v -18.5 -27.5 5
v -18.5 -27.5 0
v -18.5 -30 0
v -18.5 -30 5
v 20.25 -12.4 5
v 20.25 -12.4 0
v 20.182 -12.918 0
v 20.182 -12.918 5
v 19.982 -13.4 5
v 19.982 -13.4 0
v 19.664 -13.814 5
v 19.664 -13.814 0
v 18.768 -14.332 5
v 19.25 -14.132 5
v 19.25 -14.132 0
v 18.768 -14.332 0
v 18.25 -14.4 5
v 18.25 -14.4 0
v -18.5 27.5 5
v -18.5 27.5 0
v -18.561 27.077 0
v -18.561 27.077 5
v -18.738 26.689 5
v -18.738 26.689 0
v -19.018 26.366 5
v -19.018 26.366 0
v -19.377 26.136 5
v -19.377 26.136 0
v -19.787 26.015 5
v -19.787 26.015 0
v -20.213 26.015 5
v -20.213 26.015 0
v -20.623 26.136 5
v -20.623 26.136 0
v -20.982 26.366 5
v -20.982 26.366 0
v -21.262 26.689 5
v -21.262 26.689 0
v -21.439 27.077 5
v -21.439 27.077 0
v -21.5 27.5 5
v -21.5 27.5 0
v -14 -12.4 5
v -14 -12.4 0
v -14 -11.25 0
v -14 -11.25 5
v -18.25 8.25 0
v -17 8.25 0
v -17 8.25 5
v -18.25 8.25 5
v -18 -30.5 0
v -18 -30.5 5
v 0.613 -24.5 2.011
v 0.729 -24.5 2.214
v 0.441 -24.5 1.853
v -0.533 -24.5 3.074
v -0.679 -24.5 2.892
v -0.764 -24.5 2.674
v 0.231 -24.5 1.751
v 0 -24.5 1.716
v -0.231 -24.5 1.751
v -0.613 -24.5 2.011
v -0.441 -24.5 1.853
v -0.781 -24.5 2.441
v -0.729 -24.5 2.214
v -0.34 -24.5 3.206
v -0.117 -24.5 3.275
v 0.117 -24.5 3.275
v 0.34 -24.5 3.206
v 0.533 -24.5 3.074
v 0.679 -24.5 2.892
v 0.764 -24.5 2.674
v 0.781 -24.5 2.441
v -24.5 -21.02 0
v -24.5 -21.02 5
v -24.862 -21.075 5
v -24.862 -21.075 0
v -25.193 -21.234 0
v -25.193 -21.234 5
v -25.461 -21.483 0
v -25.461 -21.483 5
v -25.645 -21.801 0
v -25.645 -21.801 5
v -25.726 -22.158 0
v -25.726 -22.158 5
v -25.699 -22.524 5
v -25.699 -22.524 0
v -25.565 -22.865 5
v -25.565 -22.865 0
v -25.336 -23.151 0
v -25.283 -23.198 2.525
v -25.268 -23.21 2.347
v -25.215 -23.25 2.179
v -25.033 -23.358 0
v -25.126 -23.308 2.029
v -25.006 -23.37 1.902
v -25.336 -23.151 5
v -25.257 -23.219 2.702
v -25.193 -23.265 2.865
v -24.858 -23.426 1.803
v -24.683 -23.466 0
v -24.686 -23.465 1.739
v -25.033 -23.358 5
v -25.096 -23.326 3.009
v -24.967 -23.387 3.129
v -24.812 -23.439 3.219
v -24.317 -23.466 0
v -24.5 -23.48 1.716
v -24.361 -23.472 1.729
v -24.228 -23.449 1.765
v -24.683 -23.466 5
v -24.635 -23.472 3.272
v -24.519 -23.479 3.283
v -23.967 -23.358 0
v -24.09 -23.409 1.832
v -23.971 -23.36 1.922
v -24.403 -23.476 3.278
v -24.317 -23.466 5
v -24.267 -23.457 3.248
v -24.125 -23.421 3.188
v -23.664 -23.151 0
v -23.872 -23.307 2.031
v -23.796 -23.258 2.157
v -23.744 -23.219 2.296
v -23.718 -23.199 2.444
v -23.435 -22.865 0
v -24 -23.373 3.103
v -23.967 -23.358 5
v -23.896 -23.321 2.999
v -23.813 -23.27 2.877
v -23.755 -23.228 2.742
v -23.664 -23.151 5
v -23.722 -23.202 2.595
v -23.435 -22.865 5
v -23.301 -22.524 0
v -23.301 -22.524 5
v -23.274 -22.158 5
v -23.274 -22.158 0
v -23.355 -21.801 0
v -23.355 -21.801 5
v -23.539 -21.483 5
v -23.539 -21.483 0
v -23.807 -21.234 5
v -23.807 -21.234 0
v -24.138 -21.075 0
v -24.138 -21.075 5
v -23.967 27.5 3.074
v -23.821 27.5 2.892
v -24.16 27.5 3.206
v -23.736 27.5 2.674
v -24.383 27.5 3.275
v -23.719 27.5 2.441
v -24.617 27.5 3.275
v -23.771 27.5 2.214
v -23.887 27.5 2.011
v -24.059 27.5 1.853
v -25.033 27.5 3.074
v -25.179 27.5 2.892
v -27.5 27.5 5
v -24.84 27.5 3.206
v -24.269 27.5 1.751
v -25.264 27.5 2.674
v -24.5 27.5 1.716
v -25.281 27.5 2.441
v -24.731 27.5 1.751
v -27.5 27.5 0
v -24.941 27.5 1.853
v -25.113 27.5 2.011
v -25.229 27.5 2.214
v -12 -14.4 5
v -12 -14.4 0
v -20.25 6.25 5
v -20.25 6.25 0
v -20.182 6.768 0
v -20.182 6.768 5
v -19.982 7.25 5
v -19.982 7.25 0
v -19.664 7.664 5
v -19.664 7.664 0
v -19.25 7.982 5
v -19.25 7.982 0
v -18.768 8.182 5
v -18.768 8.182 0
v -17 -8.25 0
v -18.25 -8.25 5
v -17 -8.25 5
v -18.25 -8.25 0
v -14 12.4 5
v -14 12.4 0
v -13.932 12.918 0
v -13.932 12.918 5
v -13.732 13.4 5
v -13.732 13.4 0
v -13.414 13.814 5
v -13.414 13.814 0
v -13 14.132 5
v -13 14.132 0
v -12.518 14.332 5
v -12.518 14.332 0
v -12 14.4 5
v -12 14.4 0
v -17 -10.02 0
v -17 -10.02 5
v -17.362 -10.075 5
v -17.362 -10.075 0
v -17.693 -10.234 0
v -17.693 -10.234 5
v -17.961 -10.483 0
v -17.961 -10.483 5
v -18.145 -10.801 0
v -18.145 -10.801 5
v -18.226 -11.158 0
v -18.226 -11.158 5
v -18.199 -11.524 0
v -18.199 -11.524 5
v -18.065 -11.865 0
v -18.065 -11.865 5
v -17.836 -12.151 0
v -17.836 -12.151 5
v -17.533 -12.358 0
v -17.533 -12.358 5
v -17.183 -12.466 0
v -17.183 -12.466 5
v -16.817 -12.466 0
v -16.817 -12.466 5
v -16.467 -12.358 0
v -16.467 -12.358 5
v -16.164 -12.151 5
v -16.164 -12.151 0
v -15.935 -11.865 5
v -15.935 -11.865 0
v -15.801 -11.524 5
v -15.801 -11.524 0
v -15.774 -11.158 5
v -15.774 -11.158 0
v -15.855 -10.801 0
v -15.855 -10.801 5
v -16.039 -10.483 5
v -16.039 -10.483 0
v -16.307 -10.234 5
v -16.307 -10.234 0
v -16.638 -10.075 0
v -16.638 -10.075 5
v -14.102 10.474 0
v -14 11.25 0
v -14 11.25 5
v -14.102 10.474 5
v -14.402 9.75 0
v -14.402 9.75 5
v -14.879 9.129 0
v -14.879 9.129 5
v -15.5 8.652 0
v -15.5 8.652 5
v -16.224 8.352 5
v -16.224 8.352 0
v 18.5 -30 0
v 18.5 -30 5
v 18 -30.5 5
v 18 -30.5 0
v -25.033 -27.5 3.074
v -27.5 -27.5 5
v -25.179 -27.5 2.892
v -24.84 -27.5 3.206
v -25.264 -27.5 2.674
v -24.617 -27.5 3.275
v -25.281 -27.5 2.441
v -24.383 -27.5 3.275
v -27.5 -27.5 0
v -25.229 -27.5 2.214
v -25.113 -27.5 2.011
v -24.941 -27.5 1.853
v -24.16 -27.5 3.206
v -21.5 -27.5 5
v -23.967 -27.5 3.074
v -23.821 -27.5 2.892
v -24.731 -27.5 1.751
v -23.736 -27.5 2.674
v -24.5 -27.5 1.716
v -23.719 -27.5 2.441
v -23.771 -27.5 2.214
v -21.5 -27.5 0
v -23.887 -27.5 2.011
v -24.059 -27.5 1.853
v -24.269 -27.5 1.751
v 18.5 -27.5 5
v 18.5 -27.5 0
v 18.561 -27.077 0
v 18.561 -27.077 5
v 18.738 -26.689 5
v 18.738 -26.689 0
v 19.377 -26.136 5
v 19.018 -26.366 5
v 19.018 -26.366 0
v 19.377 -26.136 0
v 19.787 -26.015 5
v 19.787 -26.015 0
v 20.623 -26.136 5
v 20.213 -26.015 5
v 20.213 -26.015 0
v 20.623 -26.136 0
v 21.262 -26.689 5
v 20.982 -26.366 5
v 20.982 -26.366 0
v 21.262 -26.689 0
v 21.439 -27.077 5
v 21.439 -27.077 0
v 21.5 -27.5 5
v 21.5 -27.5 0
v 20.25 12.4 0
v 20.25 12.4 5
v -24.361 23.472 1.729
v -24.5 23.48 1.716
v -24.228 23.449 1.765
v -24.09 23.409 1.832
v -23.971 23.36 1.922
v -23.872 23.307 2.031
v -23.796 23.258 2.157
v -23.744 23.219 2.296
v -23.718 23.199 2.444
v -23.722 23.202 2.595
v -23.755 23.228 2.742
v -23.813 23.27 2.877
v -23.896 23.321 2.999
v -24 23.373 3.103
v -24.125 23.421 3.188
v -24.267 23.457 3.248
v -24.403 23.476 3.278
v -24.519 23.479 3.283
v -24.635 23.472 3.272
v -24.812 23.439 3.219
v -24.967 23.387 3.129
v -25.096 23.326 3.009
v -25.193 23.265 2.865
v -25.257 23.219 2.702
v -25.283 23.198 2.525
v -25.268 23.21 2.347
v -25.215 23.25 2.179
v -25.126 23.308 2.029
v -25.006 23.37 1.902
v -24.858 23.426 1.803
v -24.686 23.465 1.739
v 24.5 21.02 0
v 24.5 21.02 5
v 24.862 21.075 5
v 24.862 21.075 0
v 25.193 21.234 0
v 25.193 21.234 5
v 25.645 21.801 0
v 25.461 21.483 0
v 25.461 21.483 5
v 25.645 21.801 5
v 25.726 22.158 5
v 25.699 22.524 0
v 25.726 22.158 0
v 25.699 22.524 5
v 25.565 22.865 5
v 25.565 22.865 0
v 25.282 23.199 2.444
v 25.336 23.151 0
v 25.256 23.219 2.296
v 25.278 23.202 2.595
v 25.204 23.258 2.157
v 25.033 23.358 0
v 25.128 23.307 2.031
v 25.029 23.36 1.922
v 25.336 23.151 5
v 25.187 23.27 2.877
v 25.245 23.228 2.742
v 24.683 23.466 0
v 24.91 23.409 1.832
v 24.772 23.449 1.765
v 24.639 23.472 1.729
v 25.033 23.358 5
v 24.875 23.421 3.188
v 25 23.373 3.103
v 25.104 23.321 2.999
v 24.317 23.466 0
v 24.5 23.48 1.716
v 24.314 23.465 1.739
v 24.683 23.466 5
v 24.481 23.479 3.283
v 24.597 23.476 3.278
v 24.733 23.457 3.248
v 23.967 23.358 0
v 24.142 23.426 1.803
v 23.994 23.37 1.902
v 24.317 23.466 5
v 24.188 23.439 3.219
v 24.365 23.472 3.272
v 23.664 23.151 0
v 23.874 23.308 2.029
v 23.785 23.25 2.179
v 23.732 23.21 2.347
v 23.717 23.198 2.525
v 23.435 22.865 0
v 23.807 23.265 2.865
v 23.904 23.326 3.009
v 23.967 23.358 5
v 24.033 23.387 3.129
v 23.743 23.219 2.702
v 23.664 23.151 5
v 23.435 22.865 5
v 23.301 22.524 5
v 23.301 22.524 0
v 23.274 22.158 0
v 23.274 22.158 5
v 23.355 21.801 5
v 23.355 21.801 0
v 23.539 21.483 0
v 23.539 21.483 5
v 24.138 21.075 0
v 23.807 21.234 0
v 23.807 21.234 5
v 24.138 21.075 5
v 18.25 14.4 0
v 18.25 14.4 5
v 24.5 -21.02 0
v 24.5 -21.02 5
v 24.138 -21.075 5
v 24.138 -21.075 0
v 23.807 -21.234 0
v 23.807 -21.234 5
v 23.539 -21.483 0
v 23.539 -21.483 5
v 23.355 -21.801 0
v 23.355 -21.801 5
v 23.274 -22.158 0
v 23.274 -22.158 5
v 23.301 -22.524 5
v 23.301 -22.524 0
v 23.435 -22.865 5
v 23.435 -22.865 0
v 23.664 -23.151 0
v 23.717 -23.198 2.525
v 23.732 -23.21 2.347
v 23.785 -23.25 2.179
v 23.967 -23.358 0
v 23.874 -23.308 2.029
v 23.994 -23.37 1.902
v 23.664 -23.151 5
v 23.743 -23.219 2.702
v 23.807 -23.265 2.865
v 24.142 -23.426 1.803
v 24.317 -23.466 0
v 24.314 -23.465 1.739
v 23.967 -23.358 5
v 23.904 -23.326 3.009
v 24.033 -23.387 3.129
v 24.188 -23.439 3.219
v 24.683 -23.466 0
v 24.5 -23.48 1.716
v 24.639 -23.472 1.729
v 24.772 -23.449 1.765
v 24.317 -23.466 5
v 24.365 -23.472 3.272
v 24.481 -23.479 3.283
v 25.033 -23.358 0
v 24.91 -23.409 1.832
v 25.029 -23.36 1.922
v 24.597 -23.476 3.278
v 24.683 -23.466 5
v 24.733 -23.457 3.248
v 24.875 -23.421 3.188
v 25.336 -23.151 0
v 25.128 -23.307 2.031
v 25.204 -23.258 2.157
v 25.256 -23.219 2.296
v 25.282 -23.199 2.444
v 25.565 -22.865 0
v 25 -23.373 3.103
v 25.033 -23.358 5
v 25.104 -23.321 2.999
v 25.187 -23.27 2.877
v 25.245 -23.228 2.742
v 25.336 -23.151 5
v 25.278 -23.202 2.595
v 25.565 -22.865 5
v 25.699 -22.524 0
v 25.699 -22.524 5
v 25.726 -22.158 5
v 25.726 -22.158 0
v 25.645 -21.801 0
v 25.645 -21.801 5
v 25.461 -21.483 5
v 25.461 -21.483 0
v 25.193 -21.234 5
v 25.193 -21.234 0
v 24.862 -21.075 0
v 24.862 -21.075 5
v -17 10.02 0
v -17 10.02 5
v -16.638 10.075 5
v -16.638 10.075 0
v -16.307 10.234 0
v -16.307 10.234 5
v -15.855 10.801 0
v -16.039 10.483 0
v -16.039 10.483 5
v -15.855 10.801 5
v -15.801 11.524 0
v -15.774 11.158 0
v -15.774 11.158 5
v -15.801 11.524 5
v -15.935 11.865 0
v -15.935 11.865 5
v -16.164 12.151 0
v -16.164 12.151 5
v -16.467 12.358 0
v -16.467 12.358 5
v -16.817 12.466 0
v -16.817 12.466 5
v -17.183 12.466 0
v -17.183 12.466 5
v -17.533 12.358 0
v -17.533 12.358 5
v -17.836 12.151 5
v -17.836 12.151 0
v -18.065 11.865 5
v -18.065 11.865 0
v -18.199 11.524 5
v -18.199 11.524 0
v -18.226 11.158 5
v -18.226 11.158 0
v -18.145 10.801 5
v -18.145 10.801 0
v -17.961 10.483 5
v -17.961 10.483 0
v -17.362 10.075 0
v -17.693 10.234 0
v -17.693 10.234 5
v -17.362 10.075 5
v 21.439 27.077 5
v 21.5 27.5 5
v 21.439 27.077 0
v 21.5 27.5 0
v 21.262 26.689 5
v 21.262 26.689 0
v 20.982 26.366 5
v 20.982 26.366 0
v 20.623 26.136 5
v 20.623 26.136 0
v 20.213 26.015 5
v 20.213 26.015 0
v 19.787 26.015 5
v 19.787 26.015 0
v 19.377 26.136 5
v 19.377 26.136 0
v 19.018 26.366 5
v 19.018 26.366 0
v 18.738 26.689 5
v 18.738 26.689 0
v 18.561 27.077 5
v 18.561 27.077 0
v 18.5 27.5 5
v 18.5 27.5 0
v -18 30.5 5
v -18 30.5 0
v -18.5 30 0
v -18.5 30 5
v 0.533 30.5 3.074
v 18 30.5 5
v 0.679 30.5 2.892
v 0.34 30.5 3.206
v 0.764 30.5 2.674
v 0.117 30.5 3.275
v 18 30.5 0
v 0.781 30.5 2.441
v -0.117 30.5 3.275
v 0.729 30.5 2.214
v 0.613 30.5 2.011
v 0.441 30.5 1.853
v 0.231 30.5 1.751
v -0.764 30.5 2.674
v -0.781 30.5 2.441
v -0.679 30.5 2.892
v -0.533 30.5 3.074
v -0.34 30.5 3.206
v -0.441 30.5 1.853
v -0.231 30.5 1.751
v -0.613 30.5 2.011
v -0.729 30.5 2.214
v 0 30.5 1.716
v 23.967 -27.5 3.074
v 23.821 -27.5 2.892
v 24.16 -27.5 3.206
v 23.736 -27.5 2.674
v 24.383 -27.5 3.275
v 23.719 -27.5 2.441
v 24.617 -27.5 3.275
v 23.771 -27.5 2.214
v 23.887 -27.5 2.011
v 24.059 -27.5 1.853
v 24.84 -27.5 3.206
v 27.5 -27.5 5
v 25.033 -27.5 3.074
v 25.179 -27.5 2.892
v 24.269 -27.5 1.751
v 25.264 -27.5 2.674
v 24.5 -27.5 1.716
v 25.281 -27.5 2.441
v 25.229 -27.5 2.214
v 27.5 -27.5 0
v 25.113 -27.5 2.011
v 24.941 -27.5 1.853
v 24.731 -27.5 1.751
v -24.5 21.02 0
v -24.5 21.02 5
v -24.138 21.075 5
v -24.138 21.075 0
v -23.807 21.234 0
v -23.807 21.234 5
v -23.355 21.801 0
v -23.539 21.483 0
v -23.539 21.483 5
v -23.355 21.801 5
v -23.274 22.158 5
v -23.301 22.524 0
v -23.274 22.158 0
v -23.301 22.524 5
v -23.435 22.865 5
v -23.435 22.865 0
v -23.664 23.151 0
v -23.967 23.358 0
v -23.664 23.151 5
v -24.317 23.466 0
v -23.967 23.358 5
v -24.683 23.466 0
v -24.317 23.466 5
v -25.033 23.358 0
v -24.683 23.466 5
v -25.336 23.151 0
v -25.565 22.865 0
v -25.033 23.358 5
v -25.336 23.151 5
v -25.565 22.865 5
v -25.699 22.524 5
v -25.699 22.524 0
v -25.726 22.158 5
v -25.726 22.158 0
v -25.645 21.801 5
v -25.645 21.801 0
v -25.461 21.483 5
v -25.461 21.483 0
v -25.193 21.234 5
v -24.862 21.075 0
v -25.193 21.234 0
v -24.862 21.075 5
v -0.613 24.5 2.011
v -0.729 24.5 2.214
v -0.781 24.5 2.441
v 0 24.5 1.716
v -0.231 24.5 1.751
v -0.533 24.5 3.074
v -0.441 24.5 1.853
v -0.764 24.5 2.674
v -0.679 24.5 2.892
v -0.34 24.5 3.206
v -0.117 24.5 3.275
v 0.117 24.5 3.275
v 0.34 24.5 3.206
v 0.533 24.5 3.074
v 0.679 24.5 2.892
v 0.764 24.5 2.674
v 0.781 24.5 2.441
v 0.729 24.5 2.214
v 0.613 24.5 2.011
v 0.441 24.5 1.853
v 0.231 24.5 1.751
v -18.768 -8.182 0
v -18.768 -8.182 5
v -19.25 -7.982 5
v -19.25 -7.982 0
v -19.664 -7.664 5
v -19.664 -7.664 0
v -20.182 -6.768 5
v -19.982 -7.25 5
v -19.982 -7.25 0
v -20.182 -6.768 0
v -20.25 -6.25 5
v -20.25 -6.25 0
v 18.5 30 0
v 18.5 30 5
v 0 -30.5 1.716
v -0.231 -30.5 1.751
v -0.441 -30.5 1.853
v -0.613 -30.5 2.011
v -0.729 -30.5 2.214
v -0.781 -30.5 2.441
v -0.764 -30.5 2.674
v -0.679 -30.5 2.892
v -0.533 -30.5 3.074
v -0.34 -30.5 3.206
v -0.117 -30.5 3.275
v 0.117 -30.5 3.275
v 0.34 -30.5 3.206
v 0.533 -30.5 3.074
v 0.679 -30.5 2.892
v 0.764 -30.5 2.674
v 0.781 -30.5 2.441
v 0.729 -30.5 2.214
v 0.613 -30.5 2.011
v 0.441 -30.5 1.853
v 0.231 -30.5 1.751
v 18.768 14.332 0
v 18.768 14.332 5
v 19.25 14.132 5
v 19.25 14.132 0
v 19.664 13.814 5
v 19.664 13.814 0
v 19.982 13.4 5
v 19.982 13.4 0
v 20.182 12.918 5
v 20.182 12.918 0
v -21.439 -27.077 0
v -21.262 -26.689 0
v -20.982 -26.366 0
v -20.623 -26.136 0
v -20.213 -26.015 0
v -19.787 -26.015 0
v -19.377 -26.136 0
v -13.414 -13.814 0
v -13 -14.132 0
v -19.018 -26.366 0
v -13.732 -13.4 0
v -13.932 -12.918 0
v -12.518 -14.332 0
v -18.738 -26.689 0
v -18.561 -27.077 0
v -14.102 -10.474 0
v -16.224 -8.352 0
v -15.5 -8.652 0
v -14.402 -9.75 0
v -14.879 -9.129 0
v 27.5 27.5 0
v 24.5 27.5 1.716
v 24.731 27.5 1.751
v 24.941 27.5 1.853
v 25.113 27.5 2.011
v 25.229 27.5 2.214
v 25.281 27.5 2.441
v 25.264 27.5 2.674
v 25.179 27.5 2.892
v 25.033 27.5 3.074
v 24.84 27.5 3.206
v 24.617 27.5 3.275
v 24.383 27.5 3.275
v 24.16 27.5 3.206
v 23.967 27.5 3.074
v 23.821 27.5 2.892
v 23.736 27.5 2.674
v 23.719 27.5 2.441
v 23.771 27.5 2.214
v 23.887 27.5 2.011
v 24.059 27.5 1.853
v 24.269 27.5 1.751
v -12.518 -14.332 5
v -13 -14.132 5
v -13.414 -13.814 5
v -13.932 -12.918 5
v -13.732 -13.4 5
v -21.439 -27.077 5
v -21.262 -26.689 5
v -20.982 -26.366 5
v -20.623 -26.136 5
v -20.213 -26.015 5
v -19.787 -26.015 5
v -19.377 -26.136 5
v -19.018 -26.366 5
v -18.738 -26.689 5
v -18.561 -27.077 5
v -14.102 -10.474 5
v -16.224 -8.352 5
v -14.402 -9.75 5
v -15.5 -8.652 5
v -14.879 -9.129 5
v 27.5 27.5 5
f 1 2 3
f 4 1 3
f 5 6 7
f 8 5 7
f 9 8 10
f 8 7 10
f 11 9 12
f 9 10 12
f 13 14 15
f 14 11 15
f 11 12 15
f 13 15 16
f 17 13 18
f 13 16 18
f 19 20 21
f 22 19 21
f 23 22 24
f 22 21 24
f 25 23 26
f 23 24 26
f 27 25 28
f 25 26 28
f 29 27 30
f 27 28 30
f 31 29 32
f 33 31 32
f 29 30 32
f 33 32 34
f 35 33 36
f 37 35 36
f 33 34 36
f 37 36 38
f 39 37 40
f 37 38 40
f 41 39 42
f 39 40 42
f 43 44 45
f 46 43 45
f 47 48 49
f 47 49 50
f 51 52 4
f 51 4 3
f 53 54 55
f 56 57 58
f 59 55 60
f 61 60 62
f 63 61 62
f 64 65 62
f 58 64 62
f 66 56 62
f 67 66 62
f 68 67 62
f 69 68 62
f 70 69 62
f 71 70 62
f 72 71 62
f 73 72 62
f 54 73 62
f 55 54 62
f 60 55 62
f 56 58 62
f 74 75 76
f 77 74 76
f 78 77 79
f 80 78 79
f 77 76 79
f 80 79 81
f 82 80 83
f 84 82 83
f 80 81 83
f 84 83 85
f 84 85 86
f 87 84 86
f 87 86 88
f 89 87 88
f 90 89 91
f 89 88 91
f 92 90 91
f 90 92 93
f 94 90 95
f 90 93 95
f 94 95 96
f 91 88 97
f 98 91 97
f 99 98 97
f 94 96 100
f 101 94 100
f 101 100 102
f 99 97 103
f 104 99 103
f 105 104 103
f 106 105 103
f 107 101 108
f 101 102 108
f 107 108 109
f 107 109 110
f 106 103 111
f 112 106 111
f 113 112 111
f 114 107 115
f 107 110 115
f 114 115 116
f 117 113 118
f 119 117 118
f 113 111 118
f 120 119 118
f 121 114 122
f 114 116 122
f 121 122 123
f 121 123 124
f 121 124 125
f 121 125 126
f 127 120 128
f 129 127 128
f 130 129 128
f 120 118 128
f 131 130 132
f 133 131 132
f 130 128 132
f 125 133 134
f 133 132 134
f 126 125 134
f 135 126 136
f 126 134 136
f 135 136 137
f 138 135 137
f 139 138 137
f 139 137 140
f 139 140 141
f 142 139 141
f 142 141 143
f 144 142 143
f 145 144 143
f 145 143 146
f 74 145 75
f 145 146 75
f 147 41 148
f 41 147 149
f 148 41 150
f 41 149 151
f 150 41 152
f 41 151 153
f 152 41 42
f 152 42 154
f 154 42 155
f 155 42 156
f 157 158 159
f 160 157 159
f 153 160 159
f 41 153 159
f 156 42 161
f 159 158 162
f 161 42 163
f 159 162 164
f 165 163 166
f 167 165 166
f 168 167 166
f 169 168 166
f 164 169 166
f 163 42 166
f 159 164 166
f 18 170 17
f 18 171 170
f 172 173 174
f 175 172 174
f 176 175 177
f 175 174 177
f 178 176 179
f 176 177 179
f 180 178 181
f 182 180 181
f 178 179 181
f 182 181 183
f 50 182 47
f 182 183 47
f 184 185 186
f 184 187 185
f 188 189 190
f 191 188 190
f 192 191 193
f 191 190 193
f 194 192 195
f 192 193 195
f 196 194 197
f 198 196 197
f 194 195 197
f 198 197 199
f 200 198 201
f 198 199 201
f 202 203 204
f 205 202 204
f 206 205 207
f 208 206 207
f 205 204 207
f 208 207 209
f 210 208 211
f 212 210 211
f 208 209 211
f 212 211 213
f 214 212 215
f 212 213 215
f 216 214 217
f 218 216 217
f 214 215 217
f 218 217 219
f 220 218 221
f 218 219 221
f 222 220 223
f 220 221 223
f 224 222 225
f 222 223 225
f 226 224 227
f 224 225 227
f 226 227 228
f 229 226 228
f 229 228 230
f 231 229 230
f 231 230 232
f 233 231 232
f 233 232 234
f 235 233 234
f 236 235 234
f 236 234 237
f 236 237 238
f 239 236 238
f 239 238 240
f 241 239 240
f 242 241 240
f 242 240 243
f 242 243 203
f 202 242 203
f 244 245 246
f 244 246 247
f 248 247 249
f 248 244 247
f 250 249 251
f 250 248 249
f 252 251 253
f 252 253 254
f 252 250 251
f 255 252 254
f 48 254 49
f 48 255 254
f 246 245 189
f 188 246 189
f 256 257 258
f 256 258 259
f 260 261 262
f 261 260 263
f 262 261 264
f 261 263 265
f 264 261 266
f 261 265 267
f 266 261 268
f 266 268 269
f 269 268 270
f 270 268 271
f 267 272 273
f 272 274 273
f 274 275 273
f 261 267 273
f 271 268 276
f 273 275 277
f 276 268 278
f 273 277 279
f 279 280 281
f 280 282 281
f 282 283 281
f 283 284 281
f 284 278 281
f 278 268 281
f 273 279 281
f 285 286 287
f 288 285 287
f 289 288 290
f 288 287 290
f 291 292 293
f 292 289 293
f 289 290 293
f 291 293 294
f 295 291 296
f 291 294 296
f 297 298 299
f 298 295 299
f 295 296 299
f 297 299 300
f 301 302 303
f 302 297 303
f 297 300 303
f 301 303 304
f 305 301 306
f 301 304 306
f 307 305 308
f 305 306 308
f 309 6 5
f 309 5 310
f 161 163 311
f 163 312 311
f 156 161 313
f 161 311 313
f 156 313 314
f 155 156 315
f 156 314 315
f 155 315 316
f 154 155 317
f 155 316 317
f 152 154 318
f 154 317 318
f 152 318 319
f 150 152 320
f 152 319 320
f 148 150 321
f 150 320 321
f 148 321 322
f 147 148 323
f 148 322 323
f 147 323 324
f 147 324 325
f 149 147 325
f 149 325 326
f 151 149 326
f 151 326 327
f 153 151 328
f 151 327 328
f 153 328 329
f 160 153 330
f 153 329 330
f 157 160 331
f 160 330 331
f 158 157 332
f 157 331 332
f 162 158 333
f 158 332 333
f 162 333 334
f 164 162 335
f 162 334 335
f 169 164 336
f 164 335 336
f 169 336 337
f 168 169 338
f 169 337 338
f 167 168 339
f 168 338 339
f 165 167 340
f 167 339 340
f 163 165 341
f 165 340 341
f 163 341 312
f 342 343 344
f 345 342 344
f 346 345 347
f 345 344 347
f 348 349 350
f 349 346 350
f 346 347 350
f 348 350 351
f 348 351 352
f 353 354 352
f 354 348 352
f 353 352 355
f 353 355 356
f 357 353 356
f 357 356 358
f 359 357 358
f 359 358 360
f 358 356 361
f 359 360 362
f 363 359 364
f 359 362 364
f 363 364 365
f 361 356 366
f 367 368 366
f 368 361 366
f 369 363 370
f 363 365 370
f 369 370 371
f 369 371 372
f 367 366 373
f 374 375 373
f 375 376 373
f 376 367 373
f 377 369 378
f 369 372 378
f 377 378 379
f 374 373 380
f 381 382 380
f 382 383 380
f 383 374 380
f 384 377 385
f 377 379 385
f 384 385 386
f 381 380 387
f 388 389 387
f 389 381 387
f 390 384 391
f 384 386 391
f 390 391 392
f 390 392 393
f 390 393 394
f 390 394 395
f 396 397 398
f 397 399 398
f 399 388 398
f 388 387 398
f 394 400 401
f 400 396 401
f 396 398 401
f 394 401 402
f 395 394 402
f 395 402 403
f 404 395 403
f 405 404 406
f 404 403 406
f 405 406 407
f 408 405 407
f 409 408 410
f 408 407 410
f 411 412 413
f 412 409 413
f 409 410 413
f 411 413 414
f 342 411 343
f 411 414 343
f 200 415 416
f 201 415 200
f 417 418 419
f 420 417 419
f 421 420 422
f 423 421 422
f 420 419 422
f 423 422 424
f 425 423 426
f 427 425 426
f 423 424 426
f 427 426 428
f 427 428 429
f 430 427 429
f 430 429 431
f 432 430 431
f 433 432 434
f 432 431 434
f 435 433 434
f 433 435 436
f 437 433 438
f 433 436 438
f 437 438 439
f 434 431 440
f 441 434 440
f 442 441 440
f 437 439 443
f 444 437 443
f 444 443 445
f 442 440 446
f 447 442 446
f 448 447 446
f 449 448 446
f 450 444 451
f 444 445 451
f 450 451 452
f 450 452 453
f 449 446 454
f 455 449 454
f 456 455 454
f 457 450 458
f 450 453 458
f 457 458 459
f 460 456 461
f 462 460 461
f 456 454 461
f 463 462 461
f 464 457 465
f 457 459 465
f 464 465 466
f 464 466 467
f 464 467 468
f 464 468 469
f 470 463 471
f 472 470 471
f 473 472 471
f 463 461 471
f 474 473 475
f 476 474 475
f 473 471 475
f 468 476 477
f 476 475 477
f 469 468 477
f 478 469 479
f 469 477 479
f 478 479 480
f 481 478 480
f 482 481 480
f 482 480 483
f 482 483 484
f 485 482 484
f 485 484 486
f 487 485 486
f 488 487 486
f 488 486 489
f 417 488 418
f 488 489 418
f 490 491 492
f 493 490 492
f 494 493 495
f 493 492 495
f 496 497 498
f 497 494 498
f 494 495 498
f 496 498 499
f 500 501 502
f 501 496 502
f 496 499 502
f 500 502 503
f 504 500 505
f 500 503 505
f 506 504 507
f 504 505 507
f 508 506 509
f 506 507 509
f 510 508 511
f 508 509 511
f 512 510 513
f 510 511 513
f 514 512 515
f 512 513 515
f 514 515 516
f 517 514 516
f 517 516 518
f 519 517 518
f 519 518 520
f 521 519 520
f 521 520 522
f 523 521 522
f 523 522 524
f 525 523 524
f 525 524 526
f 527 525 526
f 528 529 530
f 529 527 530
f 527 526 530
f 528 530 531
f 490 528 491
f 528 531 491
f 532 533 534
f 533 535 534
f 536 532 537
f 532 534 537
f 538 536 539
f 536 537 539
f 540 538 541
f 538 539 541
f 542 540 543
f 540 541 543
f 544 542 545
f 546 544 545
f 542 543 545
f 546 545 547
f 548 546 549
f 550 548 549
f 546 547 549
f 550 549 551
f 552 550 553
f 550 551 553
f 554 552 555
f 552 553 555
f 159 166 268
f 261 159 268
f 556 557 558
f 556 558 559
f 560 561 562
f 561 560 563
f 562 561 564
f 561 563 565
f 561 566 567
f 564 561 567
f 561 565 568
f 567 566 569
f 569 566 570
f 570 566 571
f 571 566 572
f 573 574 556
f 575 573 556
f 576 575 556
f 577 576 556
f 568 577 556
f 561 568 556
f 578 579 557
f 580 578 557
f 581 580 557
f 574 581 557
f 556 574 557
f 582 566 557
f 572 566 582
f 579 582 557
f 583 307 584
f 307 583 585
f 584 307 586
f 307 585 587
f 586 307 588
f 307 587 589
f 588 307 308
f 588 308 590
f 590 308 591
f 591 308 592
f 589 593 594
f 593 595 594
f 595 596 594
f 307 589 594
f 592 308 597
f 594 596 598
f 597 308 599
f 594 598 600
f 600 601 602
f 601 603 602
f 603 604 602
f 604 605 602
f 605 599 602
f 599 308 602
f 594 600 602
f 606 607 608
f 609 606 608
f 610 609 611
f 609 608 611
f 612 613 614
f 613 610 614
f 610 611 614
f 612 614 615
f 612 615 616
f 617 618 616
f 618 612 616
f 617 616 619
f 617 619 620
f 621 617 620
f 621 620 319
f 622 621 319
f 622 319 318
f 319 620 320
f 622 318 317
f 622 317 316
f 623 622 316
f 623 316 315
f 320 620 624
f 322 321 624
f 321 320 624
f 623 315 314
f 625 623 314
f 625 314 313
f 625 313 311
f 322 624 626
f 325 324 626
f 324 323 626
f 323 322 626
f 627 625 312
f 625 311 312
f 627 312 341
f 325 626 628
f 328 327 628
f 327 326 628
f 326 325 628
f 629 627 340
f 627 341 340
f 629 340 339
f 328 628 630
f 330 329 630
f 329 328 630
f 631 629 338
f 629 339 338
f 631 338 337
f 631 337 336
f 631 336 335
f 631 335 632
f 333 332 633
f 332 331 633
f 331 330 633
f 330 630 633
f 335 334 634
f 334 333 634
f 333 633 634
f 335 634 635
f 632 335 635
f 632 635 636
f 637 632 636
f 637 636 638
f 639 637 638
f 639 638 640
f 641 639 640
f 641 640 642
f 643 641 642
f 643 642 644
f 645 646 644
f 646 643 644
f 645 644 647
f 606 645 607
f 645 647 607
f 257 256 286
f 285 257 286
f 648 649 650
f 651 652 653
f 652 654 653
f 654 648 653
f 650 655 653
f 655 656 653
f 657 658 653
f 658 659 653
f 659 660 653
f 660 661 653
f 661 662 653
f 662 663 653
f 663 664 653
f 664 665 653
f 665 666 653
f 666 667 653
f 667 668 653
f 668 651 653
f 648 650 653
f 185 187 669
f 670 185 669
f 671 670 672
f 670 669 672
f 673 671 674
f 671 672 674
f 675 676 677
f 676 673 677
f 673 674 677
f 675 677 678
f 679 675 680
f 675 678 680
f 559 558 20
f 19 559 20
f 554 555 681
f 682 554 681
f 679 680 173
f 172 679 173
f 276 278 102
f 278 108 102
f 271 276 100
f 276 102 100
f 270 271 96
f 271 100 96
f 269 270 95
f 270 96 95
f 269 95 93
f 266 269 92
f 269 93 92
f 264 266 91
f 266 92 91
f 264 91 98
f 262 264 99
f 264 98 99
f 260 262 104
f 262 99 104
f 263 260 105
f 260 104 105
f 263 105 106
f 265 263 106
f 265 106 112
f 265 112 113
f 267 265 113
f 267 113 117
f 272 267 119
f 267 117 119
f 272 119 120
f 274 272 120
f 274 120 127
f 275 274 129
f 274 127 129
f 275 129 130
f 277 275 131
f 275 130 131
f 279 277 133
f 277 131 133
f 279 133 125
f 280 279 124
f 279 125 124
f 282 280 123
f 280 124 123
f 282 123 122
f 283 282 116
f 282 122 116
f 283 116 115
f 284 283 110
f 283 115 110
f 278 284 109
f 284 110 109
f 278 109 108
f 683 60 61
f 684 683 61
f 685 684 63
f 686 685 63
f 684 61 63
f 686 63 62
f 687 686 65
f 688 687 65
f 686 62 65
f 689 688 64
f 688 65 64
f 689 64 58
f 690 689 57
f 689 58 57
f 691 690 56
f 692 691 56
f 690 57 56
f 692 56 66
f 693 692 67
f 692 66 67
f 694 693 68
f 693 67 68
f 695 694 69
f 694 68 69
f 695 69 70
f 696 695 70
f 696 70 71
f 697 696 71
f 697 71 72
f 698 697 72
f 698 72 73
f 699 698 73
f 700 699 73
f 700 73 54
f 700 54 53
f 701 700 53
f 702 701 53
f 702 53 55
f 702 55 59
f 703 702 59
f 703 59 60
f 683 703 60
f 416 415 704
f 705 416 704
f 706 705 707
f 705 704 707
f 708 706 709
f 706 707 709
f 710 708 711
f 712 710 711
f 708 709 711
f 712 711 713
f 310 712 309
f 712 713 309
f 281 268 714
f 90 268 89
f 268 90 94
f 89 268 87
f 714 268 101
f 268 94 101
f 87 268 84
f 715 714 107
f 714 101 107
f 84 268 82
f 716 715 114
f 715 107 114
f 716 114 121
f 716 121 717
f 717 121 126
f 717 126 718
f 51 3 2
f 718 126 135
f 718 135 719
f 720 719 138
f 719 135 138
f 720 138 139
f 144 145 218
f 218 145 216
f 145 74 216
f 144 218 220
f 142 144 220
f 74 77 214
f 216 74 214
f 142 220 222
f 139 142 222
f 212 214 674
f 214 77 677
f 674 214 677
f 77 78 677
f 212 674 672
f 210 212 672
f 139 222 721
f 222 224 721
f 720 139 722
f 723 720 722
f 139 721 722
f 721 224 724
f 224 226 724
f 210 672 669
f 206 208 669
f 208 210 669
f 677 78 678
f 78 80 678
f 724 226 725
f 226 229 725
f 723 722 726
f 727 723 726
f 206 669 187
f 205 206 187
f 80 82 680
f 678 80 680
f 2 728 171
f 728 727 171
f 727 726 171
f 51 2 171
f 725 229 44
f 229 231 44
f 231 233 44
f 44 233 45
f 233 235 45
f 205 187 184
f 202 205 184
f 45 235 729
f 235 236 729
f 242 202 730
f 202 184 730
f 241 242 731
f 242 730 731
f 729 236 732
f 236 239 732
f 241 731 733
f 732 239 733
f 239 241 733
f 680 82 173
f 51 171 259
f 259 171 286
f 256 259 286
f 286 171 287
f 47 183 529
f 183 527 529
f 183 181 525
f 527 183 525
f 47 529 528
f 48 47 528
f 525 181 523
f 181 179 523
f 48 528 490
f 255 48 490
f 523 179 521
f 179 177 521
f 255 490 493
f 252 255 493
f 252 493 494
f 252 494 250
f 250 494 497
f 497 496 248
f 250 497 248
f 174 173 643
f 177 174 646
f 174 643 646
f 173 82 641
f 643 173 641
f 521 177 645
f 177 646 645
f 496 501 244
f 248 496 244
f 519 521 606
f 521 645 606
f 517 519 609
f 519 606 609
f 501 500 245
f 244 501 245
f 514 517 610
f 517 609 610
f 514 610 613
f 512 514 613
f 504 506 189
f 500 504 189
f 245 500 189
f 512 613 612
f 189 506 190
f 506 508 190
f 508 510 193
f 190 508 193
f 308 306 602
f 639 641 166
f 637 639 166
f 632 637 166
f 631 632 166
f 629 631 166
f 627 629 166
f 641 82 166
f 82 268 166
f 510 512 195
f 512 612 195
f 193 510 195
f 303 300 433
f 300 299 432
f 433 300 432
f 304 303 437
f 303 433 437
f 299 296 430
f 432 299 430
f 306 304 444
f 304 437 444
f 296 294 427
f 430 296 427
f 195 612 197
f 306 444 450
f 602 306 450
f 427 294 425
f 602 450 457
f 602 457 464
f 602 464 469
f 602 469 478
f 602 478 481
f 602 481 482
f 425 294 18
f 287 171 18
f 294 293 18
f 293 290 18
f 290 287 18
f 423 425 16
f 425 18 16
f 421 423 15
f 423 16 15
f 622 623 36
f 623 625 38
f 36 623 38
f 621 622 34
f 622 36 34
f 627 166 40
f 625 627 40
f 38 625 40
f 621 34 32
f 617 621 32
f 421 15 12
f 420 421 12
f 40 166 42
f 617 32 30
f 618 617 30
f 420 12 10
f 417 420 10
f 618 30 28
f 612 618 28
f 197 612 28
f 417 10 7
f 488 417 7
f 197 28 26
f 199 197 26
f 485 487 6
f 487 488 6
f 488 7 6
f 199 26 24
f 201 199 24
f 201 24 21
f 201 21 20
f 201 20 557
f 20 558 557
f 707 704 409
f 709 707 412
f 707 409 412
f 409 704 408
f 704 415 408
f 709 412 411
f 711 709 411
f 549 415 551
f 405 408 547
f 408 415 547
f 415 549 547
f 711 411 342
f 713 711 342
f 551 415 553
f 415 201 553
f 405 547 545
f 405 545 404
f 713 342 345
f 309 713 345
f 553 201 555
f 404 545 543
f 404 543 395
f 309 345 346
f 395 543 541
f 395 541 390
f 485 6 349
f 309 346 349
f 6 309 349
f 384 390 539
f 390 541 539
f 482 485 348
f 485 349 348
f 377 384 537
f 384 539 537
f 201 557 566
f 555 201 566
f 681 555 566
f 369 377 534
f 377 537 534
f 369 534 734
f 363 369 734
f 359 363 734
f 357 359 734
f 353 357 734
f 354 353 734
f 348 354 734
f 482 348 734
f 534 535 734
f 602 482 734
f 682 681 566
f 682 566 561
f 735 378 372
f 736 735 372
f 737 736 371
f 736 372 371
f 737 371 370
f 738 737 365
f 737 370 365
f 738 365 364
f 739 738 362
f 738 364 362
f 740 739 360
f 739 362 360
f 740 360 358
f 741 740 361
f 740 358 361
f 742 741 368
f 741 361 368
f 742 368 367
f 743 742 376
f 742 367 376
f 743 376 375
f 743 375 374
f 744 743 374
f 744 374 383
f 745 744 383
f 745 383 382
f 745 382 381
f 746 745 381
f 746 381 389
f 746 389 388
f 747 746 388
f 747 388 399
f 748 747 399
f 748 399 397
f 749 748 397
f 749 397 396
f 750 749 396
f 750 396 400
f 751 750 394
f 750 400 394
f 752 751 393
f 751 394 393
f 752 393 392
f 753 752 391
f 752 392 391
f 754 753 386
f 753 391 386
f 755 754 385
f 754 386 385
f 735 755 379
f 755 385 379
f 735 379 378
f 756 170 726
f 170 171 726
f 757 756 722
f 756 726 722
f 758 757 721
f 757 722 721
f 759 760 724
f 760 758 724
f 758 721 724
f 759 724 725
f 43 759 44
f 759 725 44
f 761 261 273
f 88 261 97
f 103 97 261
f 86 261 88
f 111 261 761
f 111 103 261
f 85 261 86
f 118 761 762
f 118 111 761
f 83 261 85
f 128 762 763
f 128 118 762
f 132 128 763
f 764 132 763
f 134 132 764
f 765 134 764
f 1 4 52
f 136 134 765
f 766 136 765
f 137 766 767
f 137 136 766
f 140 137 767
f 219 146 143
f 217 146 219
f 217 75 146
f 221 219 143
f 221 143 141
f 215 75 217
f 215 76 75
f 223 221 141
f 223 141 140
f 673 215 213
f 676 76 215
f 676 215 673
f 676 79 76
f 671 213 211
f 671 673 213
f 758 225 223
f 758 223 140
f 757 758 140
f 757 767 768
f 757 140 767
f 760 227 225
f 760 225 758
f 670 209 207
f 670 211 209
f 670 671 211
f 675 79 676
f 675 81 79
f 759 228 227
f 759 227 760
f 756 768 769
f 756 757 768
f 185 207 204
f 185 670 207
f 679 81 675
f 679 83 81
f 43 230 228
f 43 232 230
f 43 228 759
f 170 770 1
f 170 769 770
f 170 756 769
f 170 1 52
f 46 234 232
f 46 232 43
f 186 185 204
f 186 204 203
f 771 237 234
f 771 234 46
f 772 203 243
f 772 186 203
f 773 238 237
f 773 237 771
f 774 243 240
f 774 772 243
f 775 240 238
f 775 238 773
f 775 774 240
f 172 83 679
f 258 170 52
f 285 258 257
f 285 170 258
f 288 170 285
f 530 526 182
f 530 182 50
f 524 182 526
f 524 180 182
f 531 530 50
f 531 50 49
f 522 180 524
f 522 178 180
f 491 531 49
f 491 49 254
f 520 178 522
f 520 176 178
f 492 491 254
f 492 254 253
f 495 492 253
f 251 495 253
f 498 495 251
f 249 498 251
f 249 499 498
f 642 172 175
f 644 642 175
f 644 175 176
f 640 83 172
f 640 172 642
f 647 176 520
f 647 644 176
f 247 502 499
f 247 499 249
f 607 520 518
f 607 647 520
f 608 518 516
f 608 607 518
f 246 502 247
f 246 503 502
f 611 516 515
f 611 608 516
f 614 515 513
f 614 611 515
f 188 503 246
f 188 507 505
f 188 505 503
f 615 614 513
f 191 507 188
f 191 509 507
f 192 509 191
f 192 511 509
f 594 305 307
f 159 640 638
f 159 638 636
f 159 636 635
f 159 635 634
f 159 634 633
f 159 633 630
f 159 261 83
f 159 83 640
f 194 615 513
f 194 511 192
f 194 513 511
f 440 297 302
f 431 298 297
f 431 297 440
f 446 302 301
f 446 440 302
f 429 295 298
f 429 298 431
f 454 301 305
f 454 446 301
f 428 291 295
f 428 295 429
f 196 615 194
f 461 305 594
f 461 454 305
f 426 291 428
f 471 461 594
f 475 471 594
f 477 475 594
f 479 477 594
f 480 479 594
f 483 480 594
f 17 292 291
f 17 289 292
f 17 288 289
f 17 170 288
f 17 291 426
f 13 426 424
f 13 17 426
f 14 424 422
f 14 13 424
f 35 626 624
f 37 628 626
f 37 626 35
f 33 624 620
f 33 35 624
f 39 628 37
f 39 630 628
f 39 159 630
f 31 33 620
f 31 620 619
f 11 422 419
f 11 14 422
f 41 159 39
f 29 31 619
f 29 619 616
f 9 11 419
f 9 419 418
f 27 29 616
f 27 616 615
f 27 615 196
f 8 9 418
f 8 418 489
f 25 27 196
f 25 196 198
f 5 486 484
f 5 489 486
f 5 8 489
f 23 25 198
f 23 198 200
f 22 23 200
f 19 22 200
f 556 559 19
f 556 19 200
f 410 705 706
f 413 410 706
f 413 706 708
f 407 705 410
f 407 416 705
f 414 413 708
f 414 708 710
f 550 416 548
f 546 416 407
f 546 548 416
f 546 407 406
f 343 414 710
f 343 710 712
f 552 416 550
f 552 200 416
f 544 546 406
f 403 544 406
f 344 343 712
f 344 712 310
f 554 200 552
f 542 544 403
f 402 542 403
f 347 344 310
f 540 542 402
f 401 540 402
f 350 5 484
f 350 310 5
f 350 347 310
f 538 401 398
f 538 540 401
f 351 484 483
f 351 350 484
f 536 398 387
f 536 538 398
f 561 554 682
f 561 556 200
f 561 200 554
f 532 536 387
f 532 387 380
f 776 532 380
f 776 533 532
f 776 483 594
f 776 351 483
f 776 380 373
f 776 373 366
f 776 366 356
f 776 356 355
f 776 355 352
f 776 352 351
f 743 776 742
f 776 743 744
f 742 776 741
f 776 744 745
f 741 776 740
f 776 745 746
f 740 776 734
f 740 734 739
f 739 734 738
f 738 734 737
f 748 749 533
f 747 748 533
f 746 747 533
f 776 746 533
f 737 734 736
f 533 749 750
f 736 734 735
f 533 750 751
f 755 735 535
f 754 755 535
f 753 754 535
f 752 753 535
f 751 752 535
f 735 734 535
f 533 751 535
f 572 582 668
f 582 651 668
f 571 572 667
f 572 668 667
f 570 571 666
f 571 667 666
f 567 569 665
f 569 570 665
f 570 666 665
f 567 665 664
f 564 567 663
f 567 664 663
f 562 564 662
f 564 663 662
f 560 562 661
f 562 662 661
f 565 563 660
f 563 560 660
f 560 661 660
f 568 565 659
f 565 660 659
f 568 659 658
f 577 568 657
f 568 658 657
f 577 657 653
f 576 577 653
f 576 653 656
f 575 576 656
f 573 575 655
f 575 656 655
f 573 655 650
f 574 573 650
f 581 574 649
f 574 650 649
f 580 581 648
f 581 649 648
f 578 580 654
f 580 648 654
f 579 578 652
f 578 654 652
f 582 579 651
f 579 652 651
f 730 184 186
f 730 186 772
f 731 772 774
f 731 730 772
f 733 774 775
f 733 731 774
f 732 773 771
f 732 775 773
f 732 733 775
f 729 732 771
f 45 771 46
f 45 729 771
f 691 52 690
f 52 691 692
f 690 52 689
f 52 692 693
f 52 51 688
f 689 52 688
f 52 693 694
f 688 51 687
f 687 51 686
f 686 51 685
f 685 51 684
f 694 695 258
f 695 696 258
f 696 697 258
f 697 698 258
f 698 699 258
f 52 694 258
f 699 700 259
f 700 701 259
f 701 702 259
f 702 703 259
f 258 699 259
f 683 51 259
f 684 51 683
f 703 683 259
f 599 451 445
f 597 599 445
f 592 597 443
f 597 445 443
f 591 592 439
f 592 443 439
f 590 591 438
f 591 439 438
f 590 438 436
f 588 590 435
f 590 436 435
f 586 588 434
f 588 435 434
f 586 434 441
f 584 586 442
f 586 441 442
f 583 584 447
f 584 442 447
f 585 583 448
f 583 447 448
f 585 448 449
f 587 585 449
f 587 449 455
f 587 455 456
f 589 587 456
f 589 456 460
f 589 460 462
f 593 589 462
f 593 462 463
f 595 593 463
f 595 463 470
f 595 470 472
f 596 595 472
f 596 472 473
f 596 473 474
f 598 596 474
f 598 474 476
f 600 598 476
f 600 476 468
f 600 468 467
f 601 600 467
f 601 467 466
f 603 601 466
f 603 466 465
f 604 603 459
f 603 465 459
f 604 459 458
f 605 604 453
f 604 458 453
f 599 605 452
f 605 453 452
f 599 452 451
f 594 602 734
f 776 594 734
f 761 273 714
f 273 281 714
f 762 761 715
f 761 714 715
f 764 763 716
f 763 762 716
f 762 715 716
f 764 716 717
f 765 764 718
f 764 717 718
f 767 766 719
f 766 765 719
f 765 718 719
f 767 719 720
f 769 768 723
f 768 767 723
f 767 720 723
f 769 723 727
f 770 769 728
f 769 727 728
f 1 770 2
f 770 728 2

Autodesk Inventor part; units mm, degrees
ref_plane "YZ Plane" through (0, 0, 0) normal (1, 0, 0) x (0, 1, 0)
ref_plane "XZ Plane" through (0, 0, 0) normal (0, 1, 0) x (-1, 0, 0)
ref_plane "XY Plane" through (0, 0, 0) normal (0, 0, 1) x (1, 0, 0)
sketch "Sketch1" plane through (0, 0, 0) normal (0, 0, 1) x (1, 0, 0)
  line L0 (-27.5, -27.5) -> (27.5, -27.5)
  line L1 (27.5, -27.5) -> (27.5, 27.5)
  line L2 (27.5, 27.5) -> (-27.5, 27.5)
  line L3 (-27.5, 27.5) -> (-27.5, -27.5)
  line L4 (-27.5, -27.5) -> (27.5, 27.5) construction
  line L5 (27.5, -27.5) -> (-27.5, 27.5) construction
  line L6 (-20, 14.15) -> (20, 14.15) construction
  line L7 (20, 14.15) -> (20, -14.15) construction
  line L8 (20, -14.15) -> (-20, -14.15) construction
  line L9 (-20, -14.15) -> (-20, 14.15) construction
  line L10 (-20, 14.15) -> (20, -14.15) construction
  line L11 (20, 14.15) -> (-20, -14.15) construction
  line L12 (0, -27.5) -> (0, 27.5) construction
  line L13 (-27.5, 0) -> (27.5, 0)
  line L14 (17, 11.25) -> (-17, 11.25) construction
  line L15 (-17, 11.25) -> (-17, -11.25) construction
  line L16 (-17, -11.25) -> (17, -11.25) construction
  line L17 (17, -11.25) -> (17, 11.25) construction
  line L18 (17, 11.25) -> (-17, -11.25) construction
  line L19 (-17, 11.25) -> (17, -11.25) construction
  line L20 (20.25, -12.4) -> (20.25, 12.4)
  line L21 (-18.5, -27.5) -> (-18.5, -30.5)
  line L22 (-18.5, -30.5) -> (18.5, -30.5)
  line L23 (18.5, -30.5) -> (18.5, -27.5)
  arc A0 (-18.5, -27.5) -> (-21.5, -27.5) centre (-20, -27.5) ccw
  line L24 (-24.5, -27.5) -> (-24.5, -21.5) construction
  arc A1 (21.5, -27.5) -> (18.5, -27.5) centre (20, -27.5) ccw
  line L25 (24.5, -27.5) -> (24.5, -21.5) construction
  line L26 (-18.5, 27.5) -> (-18.5, 30.5)
  line L27 (-18.5, 30.5) -> (18.5, 30.5)
  line L28 (18.5, 30.5) -> (18.5, 27.5)
  arc A2 (-21.5, 27.5) -> (-18.5, 27.5) centre (-20, 27.5) ccw
  line L29 (-24.5, 27.5) -> (-24.5, 21.5) construction
  arc A3 (18.5, 27.5) -> (21.5, 27.5) centre (20, 27.5) ccw
  line L30 (24.5, 27.5) -> (24.5, 21.5) construction
  line L31 (-12, -14.4) -> (18.25, -14.4)
  line L32 (-14, -12.4) -> (-14, -11.25)
  line L33 (-18.25, -8.25) -> (-17, -8.25)
  line L34 (-20.25, -6.25) -> (-20.25, 6.25)
  arc A4 (-14, -11.25) -> (-17, -8.25) centre (-17, -11.25) ccw
  line L35 (-12, 14.4) -> (18.25, 14.4)
  line L36 (-14, 12.4) -> (-14, 11.25)
  line L37 (-18.25, 8.25) -> (-17, 8.25)
  arc A5 (-17, 8.25) -> (-14, 11.25) centre (-17, 11.25) ccw
  arc A6 (-20.25, -6.25) -> (-18.25, -8.25) centre (-18.25, -6.25) ccw
  arc A7 (-14, -12.4) -> (-12, -14.4) centre (-12, -12.4) ccw
  arc A8 (18.25, -14.4) -> (20.25, -12.4) centre (18.25, -12.4) ccw
  arc A9 (20.25, 12.4) -> (18.25, 14.4) centre (18.25, 12.4) ccw
  arc A10 (-12, 14.4) -> (-14, 12.4) centre (-12, 12.4) ccw
  arc A11 (-18.25, 8.25) -> (-20.25, 6.25) centre (-18.25, 6.25) ccw
  line L38 (24.5, 22.25) -> (-24.5, 22.25) construction
  line L39 (-24.5, 22.25) -> (-24.5, -22.25) construction
  line L40 (-24.5, -22.25) -> (24.5, -22.25) construction
  line L41 (24.5, -22.25) -> (24.5, 22.25) construction
  line L42 (24.5, 22.25) -> (-24.5, -22.25) construction
  line L43 (-24.5, 22.25) -> (24.5, -22.25) construction
  line L44 (32.5, 26.5) -> (-32.5, 26.5) construction
  line L45 (-32.5, 26.5) -> (-32.5, -26.5) construction
  line L46 (-32.5, -26.5) -> (32.5, -26.5) construction
  line L47 (32.5, -26.5) -> (32.5, 26.5) construction
  line L48 (32.5, 26.5) -> (-32.5, -26.5) construction
  line L49 (-32.5, 26.5) -> (32.5, -26.5) construction
  circle A12 centre (-24.5, -22.25) radius 1.5 construction
  point P0 (0, 0)
  point P1 (21.5, 27.5)
  point P2 (-21.5, 27.5)
  point P3 (21.5, -27.5)
  point P4 (20.25, 0)
  point P5 (-14, -14.4)
  point P6 (20.25, -14.4)
  point P7 (-20.25, -8.25)
  point P8 (-14, 14.4)
  point P9 (20.25, 14.4)
  point P10 (-20.25, 8.25)
  point P11 (-20.25, 0)
  dimension "d0" = 55
  dimension "d1" = 55
  dimension "d2" = 40
  dimension "d3" = 28.3
  dimension "d4" = 34
  dimension "d5" = 22.5
  dimension "d8" = 1.5
  dimension "d9" = 6
  dimension "d10" = 6
  dimension "d11" = 3
  dimension "d35" = 6
  dimension "d36" = 0.25
  dimension "d37" = 0.25
  dimension "d38" = 2
  dimension "d39" = 6
  dimension "d40" = 8.5
  dimension "d41" = 16
  dimension "d42" = 1
  dimension "d43" = 3
  dimension "d44" = 3.75
  dimension "d45" = 49
extrude "Extrusion1" add sketch "Sketch1" along normal blind 5 contours L3 L13 L34 A6 L33 A4 L32 A7 L31 A8 L20 L1 L0 A1 A0 | L0 L23 L22 L21
hole "M3" at (-17, -11.25, 0) at (-24.5, -22.25, 0) at (24.5, -22.25, 0) direction (0, 0, 1) diameter 2.459 end through all thread size "M3x0.5" class "6H" standard "ANSI Metric M Profile"
chamfer "C0.5" distance 0.5 angle 45 2 edges at (-18.5, -30.5, 2.5) (18.5, -30.5, 2.5)
sketch "Sketch3" plane through (-18, -30.5, 0) normal (0, -1, 0) x (1, 0, 0)
  line L0 (18, 0) -> (18, 5)
  line L1 (0, 5) -> (36, 5) projected
  point P0 (18, 2.5)
sketch "Sketch2" plane through (21.5, -27.5, 0) normal (0, -1, 0) x (1, 0, 0)
  line L0 (3, 0) -> (3, 5)
  line L1 (-49, 5) -> (6, 5) projected
  line L2 (-46, 0) -> (-46, 5)
  line L3 (-49, 5) -> (6, 5) projected
  line L4 (0, 0) -> (6, 0) projected
  line L5 (-49, 0) -> (-43, 0) projected
  point P0 (0, 5)
  point P1 (-43, 5)
  point P2 (-46, 2.5)
  point P3 (3, 2.5)
  point P4 (3, 0)
  point P5 (3, 0)
  point P6 (3, 0)
hole "Side-M2-6(1)" at (24.5, -27.5, 2.5) at (-24.5, -27.5, 2.5) direction (0, 1, 0) diameter 1.567 depth 6 thread size "M2x0.4" class "6H" standard "ANSI Metric M Profile"
hole "Side-M2-6(2)" at (0, -30.5, 2.5) direction (0, 1, 0) diameter 1.567 depth 6 thread size "M2x0.4" class "6H" standard "ANSI Metric M Profile"
mirror "Mirror1" about plane through (0, 0, 0) normal (0, 1, 0)
equation "\"d37\" = d36"
equation "\"d26\" = d9"
properties part number "HeadUpperFrame" material "Acetal Resin, Black"
